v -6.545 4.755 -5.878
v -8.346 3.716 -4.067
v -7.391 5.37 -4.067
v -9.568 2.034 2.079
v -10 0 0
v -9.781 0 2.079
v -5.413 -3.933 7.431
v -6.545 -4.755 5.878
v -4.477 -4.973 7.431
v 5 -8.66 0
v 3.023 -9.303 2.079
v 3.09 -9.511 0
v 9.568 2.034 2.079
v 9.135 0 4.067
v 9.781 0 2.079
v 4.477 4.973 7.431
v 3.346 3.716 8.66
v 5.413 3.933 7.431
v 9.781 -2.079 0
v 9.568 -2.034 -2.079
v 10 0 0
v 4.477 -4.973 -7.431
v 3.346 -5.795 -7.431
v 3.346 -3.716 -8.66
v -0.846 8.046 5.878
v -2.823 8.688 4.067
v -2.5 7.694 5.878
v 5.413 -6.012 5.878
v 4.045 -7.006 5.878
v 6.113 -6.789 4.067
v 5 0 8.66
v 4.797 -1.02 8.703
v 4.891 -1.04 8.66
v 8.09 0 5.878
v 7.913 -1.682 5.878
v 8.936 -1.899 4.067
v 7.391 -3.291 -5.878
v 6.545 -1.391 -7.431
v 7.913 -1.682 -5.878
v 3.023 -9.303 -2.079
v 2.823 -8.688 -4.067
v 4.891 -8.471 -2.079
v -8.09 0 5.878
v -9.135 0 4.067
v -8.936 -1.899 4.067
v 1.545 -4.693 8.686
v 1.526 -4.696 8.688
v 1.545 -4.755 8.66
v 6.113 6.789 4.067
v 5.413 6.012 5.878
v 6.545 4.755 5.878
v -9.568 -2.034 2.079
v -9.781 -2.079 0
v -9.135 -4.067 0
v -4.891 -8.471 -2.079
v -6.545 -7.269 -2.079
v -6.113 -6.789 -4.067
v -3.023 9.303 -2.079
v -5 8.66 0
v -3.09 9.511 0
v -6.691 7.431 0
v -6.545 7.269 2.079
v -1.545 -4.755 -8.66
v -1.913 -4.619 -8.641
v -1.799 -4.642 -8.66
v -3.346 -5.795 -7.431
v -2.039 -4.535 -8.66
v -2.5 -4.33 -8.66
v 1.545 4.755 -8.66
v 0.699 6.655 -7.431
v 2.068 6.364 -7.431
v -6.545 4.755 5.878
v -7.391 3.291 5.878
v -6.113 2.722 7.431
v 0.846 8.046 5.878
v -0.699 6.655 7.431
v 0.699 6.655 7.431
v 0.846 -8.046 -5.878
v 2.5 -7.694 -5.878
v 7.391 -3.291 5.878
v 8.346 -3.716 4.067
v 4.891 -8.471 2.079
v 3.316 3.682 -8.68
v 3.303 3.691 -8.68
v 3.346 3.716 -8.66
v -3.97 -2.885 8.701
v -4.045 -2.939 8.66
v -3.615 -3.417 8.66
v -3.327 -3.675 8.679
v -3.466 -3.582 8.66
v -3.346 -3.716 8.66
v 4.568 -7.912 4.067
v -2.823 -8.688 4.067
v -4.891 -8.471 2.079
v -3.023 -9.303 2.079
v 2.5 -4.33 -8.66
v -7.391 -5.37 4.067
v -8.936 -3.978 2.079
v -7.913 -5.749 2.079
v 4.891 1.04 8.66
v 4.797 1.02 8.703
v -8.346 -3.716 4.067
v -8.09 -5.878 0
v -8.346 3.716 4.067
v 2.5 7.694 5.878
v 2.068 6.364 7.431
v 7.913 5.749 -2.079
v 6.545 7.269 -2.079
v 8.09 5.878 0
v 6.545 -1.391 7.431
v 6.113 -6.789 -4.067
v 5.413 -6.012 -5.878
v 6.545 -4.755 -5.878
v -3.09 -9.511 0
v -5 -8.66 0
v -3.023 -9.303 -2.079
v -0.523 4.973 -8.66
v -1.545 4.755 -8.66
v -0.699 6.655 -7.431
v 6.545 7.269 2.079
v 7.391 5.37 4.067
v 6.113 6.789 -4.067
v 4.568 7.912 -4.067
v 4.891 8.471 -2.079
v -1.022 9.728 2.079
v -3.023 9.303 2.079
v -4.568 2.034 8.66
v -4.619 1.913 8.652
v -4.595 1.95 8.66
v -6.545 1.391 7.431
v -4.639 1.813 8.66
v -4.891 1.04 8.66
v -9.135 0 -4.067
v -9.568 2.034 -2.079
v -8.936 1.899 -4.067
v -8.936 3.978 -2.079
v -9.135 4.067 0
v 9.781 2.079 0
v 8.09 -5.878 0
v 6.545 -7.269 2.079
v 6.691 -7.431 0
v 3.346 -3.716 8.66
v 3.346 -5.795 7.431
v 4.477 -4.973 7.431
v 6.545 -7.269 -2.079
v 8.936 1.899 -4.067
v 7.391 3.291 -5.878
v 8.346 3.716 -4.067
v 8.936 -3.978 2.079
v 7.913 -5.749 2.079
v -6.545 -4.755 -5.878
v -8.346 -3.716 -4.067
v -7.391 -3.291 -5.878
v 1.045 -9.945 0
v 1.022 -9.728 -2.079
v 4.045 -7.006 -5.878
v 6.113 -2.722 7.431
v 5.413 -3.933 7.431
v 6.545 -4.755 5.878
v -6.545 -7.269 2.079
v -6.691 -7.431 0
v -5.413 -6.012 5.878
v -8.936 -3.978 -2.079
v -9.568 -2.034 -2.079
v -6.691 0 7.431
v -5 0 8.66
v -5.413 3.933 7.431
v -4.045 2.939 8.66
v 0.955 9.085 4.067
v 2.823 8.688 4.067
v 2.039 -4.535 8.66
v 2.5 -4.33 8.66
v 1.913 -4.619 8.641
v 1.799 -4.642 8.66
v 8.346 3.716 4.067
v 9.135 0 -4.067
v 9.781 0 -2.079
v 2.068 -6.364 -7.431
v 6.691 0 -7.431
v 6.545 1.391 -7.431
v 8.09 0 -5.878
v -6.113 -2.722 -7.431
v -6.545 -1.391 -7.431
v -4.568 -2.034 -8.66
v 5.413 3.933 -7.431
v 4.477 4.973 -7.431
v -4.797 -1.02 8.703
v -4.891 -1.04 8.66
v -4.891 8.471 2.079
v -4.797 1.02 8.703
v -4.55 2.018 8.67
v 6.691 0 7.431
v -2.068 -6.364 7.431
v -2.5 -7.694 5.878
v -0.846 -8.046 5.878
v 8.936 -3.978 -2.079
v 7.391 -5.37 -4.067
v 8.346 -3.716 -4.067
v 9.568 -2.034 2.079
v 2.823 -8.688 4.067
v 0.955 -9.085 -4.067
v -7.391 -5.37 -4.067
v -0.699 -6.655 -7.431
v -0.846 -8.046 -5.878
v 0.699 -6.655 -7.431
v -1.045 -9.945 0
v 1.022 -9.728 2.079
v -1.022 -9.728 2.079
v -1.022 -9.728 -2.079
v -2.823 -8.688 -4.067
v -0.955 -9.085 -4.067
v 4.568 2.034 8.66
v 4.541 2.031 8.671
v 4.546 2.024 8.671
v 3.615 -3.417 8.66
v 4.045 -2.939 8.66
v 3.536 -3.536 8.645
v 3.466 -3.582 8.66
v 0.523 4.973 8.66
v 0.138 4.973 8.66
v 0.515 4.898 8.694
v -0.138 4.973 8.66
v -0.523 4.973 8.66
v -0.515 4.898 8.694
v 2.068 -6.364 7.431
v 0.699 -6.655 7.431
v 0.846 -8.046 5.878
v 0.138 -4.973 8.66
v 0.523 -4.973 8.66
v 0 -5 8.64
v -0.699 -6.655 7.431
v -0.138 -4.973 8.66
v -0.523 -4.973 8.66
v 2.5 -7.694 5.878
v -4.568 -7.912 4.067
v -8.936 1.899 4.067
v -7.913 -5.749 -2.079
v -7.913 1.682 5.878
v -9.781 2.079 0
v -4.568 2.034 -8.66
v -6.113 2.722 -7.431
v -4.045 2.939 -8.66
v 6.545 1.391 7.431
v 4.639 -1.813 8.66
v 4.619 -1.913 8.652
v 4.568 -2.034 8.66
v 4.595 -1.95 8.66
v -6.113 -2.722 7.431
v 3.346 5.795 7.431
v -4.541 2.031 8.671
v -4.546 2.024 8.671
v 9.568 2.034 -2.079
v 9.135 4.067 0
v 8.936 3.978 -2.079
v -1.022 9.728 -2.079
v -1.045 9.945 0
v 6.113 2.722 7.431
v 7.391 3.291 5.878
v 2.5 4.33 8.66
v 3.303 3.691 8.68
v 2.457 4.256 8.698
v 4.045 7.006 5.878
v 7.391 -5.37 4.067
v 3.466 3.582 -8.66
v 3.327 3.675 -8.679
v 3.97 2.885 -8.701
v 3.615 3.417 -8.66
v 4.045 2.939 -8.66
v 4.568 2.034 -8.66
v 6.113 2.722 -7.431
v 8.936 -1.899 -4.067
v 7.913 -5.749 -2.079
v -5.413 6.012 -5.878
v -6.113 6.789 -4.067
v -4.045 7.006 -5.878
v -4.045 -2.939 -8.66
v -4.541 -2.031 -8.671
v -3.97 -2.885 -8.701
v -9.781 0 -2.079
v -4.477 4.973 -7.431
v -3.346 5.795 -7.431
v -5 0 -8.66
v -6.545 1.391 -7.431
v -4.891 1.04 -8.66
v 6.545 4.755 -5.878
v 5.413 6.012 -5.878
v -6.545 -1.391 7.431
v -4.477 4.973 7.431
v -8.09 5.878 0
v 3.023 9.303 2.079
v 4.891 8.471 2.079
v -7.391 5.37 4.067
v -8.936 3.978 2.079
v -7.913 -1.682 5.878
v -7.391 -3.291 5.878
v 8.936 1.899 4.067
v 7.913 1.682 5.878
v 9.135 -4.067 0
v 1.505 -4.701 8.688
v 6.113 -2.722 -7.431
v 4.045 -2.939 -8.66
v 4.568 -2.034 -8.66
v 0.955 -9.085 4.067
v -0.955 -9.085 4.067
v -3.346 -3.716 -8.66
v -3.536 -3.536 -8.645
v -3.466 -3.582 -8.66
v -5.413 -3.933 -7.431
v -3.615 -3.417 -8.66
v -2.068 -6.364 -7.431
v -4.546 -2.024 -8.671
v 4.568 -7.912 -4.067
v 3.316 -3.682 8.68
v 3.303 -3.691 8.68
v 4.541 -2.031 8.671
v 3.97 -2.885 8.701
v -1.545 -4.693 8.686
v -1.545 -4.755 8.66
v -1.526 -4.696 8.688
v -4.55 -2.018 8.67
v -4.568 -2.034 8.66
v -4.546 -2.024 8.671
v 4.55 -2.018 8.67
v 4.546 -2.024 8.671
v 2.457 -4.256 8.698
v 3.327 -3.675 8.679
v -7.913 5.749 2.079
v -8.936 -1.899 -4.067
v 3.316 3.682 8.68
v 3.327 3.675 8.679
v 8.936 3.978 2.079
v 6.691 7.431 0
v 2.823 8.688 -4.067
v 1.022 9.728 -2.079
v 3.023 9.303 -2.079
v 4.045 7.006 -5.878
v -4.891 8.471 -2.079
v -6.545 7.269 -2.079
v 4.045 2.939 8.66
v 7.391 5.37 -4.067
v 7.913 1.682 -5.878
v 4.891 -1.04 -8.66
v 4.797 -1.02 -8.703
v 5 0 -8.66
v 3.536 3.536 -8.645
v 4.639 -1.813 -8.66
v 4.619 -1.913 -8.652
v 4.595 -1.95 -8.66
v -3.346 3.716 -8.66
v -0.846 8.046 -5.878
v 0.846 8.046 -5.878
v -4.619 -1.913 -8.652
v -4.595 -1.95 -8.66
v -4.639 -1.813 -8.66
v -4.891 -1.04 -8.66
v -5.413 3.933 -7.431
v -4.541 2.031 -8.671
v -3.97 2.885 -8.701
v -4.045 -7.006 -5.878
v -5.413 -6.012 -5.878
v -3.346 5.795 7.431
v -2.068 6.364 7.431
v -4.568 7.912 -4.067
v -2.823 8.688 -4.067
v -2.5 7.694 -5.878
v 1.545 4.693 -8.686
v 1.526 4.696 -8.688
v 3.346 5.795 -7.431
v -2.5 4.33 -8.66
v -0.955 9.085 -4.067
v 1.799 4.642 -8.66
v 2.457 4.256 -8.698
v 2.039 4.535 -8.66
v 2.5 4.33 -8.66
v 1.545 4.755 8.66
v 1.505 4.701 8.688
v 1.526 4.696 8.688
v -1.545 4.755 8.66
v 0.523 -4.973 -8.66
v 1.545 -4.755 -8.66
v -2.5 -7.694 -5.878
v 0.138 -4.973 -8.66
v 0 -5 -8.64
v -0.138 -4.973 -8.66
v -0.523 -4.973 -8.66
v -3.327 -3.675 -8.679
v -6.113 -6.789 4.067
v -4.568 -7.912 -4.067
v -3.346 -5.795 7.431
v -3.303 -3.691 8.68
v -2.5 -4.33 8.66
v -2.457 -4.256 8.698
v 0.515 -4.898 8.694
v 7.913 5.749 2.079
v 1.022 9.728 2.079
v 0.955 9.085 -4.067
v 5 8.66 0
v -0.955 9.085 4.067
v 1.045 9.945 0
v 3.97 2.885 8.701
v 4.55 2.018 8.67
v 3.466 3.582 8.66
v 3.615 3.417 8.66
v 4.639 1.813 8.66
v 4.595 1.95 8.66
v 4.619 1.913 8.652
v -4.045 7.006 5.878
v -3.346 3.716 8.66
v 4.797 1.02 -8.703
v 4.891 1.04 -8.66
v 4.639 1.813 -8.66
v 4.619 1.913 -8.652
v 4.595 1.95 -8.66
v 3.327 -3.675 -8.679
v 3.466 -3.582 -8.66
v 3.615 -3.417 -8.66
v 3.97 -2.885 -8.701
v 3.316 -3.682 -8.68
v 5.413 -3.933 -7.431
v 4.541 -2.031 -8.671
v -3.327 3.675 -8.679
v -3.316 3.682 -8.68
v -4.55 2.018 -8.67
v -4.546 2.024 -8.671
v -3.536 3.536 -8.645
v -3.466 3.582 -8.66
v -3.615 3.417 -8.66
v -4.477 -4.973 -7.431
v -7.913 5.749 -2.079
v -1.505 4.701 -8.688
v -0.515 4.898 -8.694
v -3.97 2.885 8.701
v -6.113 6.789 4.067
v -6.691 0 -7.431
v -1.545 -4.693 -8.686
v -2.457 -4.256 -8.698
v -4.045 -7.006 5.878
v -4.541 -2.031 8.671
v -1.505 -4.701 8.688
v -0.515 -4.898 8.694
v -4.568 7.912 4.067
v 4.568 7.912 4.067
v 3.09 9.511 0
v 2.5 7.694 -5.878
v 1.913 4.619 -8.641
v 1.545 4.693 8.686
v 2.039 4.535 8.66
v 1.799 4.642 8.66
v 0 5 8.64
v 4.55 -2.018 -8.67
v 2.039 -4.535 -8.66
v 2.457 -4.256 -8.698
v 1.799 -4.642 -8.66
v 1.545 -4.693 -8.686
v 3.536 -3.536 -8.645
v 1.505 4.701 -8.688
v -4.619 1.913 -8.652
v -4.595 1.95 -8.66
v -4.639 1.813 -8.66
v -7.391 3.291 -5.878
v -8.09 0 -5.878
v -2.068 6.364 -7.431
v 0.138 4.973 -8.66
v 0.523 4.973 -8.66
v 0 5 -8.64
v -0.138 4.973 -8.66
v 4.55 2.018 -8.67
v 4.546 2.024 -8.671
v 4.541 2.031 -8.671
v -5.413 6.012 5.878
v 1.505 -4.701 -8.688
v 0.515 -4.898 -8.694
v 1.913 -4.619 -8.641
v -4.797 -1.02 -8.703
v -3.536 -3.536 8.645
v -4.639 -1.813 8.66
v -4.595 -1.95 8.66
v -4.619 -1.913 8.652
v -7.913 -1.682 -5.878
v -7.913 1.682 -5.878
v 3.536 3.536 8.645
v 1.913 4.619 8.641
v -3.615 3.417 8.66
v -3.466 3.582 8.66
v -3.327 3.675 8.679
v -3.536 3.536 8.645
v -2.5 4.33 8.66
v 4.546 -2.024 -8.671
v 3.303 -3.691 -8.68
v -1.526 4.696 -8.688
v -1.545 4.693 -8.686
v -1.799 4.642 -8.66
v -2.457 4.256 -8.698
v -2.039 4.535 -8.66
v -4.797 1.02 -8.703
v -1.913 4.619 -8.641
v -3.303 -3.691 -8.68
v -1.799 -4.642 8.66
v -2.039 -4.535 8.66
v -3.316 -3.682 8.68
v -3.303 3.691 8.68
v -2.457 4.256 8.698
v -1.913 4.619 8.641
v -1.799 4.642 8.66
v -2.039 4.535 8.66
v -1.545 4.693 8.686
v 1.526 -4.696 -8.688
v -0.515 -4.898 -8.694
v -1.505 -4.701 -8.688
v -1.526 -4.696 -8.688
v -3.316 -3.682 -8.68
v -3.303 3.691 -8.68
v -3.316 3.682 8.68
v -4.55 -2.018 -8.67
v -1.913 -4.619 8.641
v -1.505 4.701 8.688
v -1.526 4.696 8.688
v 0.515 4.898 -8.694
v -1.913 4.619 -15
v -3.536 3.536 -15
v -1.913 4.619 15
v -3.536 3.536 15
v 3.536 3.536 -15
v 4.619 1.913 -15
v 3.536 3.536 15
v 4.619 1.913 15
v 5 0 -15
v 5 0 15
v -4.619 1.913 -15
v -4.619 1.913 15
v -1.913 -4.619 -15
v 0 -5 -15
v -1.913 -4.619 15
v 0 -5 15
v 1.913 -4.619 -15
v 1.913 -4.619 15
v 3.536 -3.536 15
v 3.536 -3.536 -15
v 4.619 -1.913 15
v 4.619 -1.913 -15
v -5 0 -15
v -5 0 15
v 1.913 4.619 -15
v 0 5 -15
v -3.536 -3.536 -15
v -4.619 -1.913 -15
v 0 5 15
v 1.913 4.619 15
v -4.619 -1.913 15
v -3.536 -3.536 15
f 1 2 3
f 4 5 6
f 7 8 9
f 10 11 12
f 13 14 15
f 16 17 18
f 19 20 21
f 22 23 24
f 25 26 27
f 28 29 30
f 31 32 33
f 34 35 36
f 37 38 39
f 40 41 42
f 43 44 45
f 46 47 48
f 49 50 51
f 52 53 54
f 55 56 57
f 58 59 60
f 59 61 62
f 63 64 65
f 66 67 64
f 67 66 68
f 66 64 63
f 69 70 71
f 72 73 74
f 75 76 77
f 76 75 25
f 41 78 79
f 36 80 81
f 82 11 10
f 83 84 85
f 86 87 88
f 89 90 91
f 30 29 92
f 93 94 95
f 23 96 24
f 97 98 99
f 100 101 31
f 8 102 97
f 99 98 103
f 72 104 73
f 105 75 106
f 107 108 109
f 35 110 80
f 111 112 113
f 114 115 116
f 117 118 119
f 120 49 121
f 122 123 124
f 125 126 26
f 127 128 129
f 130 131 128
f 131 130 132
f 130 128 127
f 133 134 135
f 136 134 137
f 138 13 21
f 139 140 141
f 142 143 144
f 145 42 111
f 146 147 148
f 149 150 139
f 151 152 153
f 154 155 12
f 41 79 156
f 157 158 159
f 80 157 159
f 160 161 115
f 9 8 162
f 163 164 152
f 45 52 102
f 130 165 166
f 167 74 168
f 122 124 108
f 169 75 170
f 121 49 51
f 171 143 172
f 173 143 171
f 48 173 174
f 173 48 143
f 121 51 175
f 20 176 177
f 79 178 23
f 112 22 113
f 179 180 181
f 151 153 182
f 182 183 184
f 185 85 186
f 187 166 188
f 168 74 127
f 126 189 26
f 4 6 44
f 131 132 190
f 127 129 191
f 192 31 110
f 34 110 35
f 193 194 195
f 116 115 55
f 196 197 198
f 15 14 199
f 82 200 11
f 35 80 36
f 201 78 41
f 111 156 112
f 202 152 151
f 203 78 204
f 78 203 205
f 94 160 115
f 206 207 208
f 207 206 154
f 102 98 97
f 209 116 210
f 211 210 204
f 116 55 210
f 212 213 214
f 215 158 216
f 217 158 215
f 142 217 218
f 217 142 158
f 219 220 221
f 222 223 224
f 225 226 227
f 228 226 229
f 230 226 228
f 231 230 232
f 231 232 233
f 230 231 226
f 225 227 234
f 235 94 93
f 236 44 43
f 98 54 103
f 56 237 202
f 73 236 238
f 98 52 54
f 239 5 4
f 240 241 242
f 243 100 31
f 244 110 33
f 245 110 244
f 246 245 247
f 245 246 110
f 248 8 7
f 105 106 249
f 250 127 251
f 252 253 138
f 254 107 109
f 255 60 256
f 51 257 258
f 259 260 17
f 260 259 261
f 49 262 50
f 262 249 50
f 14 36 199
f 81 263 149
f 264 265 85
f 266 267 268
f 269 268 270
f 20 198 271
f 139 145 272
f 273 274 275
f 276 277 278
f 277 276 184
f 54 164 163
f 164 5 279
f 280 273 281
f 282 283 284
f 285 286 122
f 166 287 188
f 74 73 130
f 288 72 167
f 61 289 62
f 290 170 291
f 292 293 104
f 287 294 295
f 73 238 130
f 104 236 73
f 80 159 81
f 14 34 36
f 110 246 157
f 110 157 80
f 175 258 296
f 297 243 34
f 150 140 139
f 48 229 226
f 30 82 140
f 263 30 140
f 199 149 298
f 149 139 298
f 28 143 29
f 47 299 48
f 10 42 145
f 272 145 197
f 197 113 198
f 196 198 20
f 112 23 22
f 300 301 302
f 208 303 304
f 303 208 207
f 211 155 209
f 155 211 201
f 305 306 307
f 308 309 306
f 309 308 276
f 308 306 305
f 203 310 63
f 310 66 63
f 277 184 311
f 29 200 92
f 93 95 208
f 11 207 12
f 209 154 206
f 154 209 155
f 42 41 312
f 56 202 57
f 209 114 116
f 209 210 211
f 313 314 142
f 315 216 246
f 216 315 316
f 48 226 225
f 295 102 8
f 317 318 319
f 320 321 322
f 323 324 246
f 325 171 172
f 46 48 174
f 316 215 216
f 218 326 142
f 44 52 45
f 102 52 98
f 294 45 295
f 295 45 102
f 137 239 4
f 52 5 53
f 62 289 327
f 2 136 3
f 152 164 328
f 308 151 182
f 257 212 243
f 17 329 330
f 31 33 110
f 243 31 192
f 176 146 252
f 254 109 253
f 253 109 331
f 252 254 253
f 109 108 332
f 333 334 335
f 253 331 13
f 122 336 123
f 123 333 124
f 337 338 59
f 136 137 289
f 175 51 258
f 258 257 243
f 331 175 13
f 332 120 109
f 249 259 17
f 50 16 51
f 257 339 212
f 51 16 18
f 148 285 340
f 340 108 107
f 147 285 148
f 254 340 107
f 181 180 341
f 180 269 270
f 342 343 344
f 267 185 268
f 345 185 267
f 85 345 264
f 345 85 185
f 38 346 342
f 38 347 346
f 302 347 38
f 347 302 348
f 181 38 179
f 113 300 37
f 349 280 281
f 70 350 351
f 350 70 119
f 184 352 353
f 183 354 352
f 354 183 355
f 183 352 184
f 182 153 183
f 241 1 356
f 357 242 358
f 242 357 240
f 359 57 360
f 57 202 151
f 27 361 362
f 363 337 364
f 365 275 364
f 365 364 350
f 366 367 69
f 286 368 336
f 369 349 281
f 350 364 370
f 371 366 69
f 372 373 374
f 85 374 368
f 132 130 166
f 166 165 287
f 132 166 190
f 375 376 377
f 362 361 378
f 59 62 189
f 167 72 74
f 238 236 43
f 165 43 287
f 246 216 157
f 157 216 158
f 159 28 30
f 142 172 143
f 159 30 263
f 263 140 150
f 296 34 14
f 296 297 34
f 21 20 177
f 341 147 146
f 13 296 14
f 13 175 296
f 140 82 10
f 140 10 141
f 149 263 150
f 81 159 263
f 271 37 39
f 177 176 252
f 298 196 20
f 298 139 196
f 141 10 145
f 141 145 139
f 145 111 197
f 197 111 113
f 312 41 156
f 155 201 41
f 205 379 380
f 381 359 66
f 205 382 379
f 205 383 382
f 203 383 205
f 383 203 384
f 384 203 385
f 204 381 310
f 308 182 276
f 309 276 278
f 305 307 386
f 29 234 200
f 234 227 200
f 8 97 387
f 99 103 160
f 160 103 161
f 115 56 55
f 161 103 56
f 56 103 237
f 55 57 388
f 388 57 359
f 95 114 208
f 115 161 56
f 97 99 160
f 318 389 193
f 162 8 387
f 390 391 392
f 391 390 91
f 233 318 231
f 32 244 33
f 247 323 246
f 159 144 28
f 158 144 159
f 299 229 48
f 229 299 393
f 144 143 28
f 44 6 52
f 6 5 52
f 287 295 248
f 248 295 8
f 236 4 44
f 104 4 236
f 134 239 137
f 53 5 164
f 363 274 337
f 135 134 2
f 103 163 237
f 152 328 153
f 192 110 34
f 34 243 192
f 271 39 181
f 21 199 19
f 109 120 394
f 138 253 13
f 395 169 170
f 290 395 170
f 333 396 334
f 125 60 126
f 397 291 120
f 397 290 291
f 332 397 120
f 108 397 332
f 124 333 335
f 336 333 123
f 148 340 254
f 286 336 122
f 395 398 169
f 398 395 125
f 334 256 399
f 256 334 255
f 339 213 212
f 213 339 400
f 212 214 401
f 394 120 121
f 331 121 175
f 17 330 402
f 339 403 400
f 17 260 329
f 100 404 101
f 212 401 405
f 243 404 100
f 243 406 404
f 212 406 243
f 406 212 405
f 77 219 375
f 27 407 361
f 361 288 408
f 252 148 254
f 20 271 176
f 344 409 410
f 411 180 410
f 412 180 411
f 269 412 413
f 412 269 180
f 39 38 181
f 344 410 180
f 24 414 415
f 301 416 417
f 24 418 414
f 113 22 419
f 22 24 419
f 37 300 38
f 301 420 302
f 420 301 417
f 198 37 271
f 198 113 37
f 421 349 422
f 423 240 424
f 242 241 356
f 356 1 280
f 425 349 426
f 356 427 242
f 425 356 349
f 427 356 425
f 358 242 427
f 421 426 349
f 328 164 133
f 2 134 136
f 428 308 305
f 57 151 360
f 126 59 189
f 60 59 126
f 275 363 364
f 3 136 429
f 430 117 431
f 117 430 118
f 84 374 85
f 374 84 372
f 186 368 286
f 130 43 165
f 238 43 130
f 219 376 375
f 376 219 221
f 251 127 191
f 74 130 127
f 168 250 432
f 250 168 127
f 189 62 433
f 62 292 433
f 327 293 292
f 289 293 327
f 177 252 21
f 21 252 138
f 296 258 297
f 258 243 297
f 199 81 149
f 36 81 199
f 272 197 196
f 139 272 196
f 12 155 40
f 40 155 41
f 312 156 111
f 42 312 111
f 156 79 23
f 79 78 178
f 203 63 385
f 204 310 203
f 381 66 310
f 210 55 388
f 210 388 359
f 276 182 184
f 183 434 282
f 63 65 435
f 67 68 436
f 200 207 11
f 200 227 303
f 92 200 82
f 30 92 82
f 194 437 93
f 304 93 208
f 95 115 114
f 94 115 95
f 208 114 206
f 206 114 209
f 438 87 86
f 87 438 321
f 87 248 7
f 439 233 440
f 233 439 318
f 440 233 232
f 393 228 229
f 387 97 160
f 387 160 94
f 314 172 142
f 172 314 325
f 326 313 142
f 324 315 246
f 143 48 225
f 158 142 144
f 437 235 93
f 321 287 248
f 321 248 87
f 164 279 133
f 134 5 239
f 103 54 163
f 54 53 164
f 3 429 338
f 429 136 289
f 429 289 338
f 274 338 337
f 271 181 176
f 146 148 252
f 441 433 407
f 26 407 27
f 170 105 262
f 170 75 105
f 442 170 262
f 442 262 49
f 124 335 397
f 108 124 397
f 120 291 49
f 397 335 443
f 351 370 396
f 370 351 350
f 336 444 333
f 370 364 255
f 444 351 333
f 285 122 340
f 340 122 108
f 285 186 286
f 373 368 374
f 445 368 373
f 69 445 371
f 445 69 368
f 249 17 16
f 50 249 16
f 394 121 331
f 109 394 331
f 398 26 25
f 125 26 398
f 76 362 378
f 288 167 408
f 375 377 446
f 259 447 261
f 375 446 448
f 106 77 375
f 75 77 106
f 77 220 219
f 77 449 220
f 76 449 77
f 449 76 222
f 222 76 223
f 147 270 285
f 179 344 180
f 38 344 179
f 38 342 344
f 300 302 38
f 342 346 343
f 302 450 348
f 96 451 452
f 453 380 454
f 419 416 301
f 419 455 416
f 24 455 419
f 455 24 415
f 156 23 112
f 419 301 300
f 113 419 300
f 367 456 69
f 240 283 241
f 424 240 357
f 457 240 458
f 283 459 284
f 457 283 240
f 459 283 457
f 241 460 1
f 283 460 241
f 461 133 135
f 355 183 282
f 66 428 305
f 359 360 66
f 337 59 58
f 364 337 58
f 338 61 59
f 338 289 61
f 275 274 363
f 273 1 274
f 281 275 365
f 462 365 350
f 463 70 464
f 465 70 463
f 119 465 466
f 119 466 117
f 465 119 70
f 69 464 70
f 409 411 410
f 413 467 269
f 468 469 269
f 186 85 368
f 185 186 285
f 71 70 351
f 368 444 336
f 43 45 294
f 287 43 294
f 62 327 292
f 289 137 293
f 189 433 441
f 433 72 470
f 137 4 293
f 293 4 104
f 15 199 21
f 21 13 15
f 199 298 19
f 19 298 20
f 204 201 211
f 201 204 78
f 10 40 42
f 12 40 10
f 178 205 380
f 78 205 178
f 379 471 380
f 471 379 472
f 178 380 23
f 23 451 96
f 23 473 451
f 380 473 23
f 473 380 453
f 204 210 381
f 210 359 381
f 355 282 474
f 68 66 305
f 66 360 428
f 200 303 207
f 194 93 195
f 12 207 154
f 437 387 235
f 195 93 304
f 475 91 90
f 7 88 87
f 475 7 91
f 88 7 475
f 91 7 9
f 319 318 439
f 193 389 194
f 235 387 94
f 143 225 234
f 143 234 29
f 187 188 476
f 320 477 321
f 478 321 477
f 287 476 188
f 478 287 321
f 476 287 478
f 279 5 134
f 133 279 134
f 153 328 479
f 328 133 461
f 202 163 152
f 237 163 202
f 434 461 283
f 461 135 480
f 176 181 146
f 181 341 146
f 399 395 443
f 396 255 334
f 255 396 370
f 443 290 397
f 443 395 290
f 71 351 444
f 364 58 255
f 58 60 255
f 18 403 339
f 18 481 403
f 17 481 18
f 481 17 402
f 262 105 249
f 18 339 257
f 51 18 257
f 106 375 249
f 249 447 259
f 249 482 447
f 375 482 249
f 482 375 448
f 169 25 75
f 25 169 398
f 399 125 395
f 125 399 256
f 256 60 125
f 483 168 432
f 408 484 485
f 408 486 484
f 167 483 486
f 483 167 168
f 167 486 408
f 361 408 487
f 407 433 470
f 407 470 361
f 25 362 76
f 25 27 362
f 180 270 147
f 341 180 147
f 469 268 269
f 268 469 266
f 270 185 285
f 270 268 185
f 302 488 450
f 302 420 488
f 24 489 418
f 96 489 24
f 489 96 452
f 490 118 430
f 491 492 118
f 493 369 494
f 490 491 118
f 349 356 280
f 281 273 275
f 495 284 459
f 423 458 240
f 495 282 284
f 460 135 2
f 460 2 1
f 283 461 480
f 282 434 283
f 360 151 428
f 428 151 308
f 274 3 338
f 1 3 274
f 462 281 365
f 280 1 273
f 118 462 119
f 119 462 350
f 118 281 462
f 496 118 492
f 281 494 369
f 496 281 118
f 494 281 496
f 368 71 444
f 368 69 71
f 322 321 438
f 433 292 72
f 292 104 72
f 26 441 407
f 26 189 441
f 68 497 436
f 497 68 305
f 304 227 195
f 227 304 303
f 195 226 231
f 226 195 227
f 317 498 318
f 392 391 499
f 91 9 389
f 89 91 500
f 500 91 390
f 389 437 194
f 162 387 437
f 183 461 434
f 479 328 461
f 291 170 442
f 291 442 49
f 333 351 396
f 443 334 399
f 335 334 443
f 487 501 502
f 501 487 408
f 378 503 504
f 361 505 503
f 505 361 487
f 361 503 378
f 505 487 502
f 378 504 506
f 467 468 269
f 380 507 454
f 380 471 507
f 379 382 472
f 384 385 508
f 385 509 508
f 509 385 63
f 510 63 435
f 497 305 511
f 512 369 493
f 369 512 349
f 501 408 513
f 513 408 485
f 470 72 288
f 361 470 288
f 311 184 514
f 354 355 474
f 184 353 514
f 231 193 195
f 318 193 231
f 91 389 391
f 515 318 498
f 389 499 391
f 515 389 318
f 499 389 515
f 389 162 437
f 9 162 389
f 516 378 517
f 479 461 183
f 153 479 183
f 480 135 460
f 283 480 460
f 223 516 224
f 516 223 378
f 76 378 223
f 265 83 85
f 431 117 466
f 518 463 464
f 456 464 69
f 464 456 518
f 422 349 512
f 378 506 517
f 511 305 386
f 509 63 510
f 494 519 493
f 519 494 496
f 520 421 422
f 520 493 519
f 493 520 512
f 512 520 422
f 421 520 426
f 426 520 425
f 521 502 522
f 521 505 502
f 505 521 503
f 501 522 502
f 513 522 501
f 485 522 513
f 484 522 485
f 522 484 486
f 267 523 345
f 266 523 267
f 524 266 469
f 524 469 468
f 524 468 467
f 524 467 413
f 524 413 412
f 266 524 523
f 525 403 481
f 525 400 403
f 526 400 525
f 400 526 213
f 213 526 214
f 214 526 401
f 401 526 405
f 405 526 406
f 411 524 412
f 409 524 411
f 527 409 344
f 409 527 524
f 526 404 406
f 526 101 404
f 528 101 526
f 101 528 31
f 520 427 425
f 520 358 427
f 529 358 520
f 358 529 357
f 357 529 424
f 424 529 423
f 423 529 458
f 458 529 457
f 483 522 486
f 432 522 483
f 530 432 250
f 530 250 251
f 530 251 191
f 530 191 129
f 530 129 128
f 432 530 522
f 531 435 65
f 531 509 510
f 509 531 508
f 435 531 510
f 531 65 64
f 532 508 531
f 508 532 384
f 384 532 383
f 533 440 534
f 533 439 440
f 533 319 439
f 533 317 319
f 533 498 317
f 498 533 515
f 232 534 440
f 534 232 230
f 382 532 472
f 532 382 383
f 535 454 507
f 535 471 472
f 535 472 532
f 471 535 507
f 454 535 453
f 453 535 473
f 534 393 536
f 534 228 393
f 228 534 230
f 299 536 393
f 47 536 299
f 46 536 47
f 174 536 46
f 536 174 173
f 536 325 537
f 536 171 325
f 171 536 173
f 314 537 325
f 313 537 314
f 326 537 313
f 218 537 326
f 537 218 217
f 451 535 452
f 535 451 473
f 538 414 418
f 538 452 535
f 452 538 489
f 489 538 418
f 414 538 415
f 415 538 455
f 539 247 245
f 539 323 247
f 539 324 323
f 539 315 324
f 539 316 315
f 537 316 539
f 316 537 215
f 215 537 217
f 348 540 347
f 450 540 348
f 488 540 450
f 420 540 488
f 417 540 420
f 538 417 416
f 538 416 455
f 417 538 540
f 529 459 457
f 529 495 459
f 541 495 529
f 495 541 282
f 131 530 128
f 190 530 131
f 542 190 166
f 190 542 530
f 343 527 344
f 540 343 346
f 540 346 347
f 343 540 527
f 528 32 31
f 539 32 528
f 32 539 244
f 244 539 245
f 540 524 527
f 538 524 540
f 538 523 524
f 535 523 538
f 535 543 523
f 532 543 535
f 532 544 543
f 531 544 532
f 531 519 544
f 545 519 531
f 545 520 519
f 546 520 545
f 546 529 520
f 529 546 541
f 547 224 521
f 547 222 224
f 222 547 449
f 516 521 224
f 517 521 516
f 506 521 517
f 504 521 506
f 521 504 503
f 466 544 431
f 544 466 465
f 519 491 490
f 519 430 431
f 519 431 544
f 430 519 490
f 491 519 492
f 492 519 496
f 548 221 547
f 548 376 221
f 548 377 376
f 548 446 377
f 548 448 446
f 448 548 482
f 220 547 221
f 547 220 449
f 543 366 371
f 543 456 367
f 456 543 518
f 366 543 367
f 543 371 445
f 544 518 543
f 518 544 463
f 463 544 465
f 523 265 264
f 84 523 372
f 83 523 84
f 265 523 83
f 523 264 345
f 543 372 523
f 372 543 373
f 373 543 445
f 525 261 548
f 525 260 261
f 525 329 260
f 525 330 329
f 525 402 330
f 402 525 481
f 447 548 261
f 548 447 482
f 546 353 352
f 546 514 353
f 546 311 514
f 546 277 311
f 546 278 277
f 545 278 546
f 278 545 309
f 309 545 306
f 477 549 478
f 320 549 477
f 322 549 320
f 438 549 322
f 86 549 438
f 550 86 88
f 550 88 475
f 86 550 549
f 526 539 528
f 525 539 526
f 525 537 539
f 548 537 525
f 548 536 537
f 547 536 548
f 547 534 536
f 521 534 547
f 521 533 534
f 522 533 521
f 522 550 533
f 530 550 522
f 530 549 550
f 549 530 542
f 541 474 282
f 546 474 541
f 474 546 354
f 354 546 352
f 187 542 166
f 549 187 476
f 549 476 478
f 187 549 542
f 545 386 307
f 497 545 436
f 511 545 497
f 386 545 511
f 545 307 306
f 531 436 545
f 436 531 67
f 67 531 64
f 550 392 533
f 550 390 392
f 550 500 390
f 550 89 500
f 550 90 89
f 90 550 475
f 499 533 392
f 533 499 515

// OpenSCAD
union(){
    sphere(r=10);
    cylinder(r=5, h=30, center=true);
}
